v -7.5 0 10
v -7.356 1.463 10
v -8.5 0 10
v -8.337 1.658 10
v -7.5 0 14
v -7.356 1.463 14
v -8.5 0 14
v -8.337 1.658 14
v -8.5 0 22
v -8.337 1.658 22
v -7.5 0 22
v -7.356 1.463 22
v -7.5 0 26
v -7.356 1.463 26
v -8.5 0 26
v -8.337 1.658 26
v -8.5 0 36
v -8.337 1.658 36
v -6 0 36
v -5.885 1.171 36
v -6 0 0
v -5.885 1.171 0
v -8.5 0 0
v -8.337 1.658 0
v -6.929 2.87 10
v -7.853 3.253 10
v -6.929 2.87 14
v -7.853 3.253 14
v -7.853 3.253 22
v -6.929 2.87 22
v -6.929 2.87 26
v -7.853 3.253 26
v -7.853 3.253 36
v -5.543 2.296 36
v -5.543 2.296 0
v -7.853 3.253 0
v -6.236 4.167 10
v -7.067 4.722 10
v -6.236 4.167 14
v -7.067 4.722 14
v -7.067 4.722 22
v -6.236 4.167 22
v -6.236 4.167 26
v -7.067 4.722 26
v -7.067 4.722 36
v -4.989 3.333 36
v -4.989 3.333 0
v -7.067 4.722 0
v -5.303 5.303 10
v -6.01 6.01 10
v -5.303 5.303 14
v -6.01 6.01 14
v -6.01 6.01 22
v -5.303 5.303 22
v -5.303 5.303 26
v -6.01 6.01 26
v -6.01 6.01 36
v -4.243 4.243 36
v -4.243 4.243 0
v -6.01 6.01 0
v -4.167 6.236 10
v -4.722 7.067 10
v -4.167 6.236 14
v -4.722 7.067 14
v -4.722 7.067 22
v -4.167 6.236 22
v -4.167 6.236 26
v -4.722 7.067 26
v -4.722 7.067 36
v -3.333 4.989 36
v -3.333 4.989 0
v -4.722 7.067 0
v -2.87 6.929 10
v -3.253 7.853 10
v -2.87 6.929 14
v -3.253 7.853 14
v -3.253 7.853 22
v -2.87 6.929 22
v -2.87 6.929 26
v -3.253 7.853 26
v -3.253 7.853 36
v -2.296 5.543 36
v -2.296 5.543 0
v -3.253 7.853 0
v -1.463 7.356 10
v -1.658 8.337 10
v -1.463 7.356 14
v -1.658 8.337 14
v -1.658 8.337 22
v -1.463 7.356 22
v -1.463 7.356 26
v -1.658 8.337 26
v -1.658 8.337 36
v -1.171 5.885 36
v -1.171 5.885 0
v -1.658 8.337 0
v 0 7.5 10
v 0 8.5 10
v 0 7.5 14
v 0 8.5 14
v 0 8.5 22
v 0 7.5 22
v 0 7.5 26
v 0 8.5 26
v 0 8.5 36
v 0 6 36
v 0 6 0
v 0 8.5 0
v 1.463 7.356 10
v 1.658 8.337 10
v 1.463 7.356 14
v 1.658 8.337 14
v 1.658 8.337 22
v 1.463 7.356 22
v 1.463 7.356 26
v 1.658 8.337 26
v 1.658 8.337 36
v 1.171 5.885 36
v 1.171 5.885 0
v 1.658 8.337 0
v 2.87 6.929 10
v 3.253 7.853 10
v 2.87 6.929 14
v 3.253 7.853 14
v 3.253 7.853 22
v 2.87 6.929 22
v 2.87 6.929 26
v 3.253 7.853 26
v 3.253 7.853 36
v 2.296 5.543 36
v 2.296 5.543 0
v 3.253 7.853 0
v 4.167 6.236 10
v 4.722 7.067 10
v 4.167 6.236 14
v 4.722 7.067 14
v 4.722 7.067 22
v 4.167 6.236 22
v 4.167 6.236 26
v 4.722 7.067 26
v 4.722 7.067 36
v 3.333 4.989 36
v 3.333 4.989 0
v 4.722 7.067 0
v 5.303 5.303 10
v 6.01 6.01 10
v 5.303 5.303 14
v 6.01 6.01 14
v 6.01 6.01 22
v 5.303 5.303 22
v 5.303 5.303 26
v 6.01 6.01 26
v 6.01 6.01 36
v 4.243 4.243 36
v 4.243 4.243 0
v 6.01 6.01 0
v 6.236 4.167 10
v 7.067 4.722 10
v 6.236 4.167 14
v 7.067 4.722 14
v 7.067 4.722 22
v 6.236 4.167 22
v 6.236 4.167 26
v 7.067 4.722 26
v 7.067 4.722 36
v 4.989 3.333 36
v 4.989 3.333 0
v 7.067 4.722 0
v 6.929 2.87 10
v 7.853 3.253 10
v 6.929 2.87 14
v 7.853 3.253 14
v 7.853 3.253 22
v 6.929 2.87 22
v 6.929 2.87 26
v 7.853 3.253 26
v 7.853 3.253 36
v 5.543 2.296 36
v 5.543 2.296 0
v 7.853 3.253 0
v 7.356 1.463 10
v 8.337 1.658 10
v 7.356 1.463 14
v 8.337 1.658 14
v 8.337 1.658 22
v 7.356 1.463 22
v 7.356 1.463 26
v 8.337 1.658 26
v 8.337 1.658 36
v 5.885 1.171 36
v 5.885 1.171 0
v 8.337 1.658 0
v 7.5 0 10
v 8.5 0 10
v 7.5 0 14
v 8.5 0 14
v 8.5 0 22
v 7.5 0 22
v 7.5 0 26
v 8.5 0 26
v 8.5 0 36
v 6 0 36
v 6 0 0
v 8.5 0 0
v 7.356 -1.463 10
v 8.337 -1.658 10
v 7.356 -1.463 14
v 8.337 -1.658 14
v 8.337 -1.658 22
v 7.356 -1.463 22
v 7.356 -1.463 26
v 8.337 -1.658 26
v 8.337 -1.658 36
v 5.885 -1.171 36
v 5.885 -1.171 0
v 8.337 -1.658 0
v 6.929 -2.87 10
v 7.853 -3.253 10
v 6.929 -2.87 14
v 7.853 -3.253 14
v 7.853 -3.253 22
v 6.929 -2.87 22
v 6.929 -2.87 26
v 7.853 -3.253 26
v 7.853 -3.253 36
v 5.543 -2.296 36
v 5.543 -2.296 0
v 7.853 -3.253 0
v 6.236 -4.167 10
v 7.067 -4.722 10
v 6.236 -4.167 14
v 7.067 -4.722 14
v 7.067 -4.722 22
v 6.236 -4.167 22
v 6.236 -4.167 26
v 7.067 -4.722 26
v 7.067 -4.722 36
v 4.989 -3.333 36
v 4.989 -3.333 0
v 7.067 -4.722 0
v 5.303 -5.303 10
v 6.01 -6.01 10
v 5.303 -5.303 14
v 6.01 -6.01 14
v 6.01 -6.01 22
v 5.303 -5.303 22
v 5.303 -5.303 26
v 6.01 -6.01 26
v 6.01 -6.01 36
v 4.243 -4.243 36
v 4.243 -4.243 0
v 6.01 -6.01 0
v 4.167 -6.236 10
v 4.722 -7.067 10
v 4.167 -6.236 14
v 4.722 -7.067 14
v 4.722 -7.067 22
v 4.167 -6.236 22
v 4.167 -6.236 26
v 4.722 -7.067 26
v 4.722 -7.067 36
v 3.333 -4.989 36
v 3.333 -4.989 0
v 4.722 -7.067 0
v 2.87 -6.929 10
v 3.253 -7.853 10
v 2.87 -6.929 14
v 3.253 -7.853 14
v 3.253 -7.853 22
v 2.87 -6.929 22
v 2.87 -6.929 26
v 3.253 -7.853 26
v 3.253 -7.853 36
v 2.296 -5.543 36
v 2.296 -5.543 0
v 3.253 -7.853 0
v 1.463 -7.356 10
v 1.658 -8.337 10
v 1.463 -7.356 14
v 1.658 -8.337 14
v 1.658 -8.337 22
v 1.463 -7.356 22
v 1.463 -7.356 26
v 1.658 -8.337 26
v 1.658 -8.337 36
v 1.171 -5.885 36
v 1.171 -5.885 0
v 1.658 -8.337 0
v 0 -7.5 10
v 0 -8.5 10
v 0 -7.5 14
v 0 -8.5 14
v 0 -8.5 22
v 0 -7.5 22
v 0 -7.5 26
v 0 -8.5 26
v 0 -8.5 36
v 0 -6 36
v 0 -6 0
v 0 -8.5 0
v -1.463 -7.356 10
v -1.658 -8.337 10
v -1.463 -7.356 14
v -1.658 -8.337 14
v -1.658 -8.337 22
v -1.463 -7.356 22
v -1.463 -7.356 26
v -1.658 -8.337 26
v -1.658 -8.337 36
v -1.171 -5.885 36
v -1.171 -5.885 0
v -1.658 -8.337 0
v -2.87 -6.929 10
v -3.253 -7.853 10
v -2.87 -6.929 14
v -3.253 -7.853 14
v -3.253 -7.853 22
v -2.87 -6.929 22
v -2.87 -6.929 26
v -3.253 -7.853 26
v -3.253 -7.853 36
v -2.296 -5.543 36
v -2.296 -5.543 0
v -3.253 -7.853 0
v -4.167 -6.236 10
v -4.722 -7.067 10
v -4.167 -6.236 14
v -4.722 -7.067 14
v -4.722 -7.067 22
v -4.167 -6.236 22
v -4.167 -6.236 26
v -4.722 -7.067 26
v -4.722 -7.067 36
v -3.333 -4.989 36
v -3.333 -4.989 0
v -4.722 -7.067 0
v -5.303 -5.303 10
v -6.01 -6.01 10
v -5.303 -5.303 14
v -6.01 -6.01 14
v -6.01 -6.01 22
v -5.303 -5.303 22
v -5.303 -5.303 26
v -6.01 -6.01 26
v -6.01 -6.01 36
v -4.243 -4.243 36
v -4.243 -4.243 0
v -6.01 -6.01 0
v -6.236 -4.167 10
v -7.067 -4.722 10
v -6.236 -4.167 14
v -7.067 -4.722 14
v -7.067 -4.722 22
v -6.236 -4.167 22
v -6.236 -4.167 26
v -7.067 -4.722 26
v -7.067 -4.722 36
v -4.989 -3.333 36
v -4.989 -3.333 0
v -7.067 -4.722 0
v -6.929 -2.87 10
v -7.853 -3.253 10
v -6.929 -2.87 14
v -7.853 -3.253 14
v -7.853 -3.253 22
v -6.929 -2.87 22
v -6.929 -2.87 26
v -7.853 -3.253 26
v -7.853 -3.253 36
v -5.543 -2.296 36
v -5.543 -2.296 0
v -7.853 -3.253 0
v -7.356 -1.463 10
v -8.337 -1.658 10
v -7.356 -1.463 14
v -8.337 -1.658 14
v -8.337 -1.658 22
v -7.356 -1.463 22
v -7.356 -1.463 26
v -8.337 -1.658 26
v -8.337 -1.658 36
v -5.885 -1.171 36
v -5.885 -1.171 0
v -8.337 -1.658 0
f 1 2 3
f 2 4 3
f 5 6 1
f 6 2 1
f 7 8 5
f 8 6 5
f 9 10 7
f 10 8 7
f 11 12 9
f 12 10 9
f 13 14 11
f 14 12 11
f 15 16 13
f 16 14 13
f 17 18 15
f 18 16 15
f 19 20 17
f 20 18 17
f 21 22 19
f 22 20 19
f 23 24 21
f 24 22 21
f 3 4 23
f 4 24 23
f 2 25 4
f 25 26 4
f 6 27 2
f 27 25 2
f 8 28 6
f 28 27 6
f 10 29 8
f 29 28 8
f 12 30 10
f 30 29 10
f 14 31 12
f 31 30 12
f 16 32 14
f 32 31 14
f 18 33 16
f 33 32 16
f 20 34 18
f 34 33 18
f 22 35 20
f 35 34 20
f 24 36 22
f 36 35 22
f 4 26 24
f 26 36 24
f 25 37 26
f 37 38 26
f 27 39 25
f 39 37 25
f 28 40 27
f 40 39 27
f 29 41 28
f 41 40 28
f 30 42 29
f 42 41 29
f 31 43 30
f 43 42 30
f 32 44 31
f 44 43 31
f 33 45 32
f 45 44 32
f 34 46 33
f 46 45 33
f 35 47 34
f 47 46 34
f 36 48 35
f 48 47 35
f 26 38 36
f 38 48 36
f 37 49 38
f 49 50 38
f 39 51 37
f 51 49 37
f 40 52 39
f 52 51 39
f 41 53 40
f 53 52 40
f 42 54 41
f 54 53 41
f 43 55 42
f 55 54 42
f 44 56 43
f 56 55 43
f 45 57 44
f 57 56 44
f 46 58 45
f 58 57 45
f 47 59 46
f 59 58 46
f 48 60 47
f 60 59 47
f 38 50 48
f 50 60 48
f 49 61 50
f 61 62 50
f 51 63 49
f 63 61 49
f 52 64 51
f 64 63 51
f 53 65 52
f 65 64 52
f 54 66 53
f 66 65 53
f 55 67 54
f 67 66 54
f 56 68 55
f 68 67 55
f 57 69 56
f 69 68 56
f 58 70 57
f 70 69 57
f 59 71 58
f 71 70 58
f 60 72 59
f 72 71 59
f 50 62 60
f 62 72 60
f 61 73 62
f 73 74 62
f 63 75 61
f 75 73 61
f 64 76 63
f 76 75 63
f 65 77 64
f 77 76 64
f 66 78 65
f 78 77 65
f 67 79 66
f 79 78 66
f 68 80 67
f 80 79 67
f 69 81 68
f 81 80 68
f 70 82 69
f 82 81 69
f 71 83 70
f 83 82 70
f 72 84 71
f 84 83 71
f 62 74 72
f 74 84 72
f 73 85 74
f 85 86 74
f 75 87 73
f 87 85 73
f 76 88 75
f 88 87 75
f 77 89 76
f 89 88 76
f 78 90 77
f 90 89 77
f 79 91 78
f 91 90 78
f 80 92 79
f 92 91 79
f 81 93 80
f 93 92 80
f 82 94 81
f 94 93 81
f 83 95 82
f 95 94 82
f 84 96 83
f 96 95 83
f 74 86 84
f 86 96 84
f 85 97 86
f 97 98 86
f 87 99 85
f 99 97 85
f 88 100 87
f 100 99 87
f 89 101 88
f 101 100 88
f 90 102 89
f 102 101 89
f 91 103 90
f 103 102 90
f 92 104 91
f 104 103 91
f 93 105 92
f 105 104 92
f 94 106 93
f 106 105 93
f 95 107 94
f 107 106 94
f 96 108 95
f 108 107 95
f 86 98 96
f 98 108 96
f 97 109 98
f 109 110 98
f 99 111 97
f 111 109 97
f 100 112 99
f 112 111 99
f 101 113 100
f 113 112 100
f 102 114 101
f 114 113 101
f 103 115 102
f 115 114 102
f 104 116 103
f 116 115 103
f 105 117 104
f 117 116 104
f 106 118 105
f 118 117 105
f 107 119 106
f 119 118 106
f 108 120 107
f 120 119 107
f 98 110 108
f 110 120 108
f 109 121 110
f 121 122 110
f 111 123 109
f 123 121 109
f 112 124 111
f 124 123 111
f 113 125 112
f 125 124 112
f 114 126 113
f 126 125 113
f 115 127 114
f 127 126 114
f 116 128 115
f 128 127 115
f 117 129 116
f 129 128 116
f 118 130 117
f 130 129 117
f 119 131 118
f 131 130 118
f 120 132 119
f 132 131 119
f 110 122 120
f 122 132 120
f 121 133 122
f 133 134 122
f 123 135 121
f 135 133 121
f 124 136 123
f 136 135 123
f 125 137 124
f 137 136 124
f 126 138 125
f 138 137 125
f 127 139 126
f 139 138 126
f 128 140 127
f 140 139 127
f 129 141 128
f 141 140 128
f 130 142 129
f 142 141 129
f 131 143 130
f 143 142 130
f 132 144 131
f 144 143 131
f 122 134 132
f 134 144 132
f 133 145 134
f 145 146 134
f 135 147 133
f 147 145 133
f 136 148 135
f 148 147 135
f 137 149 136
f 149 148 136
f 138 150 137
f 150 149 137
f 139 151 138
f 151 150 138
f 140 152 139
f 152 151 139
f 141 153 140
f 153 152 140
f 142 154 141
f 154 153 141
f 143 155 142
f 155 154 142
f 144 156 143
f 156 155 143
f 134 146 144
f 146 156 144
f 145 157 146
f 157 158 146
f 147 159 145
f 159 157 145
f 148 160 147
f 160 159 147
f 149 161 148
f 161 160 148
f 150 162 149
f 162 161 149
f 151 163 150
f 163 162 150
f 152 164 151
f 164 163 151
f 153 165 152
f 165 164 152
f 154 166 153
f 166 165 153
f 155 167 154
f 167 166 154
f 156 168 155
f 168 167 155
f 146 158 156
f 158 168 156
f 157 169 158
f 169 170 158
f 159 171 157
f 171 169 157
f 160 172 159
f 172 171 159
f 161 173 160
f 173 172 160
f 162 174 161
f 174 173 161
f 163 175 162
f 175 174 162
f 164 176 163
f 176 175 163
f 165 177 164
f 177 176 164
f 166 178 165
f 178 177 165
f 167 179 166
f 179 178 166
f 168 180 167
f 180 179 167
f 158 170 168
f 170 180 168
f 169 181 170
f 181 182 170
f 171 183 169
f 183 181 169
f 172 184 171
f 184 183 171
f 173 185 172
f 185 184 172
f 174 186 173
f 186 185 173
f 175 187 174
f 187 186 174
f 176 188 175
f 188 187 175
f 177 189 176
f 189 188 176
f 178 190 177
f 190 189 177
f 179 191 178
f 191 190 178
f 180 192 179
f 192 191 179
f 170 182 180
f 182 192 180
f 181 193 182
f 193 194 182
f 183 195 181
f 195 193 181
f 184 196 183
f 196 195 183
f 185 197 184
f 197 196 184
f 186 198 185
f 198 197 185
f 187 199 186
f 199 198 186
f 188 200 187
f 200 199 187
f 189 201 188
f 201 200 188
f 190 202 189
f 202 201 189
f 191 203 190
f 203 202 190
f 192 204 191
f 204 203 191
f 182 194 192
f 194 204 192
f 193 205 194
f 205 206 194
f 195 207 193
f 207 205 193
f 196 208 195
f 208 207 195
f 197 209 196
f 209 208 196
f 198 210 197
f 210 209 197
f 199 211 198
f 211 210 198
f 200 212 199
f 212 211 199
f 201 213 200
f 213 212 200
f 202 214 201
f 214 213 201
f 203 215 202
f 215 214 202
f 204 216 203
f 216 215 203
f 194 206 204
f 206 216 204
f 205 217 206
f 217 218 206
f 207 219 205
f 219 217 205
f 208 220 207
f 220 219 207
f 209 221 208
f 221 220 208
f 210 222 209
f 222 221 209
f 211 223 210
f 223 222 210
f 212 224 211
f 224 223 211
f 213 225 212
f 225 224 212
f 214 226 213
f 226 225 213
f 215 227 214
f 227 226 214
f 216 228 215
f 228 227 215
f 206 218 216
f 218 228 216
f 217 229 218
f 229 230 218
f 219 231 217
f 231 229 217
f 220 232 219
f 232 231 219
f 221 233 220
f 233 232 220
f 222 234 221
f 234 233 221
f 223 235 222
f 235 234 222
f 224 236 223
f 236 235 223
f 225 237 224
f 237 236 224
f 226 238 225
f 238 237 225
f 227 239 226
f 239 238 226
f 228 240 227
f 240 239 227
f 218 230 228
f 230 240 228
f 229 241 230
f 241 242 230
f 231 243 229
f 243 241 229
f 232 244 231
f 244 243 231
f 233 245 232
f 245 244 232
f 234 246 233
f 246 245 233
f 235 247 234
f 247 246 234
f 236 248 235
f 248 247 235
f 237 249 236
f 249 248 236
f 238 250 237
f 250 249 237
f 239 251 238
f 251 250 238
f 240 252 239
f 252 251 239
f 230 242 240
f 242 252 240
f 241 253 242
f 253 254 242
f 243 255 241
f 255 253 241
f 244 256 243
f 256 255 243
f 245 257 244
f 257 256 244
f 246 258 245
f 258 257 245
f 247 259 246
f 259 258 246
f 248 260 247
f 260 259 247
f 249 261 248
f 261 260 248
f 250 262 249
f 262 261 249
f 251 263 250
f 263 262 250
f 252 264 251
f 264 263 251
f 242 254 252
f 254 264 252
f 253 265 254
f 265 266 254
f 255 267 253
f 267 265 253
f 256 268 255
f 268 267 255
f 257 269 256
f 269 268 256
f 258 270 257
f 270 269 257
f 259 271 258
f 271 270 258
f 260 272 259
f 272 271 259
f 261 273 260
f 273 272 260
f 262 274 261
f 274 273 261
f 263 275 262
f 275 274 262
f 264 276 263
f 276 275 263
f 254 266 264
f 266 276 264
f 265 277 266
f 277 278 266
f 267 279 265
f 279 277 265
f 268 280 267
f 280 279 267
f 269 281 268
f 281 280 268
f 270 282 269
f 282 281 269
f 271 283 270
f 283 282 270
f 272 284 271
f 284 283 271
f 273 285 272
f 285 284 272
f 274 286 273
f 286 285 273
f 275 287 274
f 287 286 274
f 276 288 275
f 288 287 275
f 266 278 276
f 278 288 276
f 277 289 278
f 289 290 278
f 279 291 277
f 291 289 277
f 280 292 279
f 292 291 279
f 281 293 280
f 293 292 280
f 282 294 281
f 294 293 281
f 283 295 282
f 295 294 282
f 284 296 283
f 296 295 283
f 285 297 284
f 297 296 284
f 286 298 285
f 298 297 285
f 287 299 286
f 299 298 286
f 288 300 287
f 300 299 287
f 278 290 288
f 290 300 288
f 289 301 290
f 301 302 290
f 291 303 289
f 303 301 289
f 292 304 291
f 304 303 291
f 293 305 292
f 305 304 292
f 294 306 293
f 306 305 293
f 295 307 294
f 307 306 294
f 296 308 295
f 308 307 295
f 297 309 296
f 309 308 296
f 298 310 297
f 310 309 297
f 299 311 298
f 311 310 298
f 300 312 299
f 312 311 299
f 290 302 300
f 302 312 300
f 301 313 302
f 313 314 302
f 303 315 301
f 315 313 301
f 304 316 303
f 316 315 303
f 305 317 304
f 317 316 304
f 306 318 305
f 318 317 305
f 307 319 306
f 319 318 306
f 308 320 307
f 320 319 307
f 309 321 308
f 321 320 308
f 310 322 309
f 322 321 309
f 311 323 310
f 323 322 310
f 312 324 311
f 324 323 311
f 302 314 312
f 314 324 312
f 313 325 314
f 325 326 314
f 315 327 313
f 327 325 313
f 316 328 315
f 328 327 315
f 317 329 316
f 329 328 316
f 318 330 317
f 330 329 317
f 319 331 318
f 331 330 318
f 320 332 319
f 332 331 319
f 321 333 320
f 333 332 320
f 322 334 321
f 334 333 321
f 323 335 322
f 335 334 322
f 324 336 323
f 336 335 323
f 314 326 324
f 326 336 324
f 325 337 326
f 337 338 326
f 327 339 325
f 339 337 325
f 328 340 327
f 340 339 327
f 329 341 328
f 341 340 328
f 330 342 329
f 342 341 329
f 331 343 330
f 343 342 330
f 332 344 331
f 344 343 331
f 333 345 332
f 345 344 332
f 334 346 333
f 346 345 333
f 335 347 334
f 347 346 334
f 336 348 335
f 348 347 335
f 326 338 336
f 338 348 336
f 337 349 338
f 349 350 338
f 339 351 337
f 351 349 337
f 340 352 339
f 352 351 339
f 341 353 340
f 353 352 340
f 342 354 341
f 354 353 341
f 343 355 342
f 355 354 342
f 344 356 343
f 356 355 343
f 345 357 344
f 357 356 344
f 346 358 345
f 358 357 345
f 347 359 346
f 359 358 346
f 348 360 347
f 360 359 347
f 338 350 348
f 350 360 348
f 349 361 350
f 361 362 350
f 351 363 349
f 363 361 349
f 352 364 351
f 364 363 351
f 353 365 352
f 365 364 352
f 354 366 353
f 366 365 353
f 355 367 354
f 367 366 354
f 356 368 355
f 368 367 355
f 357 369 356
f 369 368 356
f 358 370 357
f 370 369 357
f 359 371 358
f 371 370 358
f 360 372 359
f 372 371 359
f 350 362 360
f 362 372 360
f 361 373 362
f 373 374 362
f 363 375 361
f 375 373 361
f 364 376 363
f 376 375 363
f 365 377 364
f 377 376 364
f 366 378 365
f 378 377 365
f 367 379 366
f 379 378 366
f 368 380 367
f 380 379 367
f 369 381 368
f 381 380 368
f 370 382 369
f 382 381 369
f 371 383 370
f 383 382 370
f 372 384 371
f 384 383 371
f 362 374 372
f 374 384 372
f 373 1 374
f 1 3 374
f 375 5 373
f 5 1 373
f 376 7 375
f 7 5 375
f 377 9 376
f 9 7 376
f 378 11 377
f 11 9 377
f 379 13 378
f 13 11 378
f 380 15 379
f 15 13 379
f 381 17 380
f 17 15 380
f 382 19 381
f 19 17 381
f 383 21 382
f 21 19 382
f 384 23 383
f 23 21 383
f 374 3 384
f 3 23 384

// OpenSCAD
$fn = 32;

// ----------------------------------------------------------------------
// Grooved revolve: plain_grooves, bore R6
// ----------------------------------------------------------------------

// --- parameters (mm) ---
bore_r = 6;               // bore radius
outer_r = 8.5;            // outer radius of the body
total_h = 36;             // overall height, Z
wall = 2.5;               // radial wall thickness
groove_w = 4;             // groove width
groove_d = 1;             // groove depth
grooves = 2;              // number of outer grooves

bbox_x = 2 * outer_r;  // full diameter
bore_d = 2 * bore_r;  // bore diameter
body_d = 2 * outer_r;  // body diameter
revolve_angle = 360;  // full turn around the Z axis

profile = [[6, 0], [8.5, 0], [8.5, 10], [7.5, 10], [7.5, 14], [8.5, 14], [8.5, 22], [7.5, 22], [7.5, 26], [8.5, 26], [8.5, 36], [6, 36]];  // primary outline, 12 points, counter clockwise

// --- the one profile operation ---
rotate_extrude(angle = revolve_angle) polygon(points = profile);
